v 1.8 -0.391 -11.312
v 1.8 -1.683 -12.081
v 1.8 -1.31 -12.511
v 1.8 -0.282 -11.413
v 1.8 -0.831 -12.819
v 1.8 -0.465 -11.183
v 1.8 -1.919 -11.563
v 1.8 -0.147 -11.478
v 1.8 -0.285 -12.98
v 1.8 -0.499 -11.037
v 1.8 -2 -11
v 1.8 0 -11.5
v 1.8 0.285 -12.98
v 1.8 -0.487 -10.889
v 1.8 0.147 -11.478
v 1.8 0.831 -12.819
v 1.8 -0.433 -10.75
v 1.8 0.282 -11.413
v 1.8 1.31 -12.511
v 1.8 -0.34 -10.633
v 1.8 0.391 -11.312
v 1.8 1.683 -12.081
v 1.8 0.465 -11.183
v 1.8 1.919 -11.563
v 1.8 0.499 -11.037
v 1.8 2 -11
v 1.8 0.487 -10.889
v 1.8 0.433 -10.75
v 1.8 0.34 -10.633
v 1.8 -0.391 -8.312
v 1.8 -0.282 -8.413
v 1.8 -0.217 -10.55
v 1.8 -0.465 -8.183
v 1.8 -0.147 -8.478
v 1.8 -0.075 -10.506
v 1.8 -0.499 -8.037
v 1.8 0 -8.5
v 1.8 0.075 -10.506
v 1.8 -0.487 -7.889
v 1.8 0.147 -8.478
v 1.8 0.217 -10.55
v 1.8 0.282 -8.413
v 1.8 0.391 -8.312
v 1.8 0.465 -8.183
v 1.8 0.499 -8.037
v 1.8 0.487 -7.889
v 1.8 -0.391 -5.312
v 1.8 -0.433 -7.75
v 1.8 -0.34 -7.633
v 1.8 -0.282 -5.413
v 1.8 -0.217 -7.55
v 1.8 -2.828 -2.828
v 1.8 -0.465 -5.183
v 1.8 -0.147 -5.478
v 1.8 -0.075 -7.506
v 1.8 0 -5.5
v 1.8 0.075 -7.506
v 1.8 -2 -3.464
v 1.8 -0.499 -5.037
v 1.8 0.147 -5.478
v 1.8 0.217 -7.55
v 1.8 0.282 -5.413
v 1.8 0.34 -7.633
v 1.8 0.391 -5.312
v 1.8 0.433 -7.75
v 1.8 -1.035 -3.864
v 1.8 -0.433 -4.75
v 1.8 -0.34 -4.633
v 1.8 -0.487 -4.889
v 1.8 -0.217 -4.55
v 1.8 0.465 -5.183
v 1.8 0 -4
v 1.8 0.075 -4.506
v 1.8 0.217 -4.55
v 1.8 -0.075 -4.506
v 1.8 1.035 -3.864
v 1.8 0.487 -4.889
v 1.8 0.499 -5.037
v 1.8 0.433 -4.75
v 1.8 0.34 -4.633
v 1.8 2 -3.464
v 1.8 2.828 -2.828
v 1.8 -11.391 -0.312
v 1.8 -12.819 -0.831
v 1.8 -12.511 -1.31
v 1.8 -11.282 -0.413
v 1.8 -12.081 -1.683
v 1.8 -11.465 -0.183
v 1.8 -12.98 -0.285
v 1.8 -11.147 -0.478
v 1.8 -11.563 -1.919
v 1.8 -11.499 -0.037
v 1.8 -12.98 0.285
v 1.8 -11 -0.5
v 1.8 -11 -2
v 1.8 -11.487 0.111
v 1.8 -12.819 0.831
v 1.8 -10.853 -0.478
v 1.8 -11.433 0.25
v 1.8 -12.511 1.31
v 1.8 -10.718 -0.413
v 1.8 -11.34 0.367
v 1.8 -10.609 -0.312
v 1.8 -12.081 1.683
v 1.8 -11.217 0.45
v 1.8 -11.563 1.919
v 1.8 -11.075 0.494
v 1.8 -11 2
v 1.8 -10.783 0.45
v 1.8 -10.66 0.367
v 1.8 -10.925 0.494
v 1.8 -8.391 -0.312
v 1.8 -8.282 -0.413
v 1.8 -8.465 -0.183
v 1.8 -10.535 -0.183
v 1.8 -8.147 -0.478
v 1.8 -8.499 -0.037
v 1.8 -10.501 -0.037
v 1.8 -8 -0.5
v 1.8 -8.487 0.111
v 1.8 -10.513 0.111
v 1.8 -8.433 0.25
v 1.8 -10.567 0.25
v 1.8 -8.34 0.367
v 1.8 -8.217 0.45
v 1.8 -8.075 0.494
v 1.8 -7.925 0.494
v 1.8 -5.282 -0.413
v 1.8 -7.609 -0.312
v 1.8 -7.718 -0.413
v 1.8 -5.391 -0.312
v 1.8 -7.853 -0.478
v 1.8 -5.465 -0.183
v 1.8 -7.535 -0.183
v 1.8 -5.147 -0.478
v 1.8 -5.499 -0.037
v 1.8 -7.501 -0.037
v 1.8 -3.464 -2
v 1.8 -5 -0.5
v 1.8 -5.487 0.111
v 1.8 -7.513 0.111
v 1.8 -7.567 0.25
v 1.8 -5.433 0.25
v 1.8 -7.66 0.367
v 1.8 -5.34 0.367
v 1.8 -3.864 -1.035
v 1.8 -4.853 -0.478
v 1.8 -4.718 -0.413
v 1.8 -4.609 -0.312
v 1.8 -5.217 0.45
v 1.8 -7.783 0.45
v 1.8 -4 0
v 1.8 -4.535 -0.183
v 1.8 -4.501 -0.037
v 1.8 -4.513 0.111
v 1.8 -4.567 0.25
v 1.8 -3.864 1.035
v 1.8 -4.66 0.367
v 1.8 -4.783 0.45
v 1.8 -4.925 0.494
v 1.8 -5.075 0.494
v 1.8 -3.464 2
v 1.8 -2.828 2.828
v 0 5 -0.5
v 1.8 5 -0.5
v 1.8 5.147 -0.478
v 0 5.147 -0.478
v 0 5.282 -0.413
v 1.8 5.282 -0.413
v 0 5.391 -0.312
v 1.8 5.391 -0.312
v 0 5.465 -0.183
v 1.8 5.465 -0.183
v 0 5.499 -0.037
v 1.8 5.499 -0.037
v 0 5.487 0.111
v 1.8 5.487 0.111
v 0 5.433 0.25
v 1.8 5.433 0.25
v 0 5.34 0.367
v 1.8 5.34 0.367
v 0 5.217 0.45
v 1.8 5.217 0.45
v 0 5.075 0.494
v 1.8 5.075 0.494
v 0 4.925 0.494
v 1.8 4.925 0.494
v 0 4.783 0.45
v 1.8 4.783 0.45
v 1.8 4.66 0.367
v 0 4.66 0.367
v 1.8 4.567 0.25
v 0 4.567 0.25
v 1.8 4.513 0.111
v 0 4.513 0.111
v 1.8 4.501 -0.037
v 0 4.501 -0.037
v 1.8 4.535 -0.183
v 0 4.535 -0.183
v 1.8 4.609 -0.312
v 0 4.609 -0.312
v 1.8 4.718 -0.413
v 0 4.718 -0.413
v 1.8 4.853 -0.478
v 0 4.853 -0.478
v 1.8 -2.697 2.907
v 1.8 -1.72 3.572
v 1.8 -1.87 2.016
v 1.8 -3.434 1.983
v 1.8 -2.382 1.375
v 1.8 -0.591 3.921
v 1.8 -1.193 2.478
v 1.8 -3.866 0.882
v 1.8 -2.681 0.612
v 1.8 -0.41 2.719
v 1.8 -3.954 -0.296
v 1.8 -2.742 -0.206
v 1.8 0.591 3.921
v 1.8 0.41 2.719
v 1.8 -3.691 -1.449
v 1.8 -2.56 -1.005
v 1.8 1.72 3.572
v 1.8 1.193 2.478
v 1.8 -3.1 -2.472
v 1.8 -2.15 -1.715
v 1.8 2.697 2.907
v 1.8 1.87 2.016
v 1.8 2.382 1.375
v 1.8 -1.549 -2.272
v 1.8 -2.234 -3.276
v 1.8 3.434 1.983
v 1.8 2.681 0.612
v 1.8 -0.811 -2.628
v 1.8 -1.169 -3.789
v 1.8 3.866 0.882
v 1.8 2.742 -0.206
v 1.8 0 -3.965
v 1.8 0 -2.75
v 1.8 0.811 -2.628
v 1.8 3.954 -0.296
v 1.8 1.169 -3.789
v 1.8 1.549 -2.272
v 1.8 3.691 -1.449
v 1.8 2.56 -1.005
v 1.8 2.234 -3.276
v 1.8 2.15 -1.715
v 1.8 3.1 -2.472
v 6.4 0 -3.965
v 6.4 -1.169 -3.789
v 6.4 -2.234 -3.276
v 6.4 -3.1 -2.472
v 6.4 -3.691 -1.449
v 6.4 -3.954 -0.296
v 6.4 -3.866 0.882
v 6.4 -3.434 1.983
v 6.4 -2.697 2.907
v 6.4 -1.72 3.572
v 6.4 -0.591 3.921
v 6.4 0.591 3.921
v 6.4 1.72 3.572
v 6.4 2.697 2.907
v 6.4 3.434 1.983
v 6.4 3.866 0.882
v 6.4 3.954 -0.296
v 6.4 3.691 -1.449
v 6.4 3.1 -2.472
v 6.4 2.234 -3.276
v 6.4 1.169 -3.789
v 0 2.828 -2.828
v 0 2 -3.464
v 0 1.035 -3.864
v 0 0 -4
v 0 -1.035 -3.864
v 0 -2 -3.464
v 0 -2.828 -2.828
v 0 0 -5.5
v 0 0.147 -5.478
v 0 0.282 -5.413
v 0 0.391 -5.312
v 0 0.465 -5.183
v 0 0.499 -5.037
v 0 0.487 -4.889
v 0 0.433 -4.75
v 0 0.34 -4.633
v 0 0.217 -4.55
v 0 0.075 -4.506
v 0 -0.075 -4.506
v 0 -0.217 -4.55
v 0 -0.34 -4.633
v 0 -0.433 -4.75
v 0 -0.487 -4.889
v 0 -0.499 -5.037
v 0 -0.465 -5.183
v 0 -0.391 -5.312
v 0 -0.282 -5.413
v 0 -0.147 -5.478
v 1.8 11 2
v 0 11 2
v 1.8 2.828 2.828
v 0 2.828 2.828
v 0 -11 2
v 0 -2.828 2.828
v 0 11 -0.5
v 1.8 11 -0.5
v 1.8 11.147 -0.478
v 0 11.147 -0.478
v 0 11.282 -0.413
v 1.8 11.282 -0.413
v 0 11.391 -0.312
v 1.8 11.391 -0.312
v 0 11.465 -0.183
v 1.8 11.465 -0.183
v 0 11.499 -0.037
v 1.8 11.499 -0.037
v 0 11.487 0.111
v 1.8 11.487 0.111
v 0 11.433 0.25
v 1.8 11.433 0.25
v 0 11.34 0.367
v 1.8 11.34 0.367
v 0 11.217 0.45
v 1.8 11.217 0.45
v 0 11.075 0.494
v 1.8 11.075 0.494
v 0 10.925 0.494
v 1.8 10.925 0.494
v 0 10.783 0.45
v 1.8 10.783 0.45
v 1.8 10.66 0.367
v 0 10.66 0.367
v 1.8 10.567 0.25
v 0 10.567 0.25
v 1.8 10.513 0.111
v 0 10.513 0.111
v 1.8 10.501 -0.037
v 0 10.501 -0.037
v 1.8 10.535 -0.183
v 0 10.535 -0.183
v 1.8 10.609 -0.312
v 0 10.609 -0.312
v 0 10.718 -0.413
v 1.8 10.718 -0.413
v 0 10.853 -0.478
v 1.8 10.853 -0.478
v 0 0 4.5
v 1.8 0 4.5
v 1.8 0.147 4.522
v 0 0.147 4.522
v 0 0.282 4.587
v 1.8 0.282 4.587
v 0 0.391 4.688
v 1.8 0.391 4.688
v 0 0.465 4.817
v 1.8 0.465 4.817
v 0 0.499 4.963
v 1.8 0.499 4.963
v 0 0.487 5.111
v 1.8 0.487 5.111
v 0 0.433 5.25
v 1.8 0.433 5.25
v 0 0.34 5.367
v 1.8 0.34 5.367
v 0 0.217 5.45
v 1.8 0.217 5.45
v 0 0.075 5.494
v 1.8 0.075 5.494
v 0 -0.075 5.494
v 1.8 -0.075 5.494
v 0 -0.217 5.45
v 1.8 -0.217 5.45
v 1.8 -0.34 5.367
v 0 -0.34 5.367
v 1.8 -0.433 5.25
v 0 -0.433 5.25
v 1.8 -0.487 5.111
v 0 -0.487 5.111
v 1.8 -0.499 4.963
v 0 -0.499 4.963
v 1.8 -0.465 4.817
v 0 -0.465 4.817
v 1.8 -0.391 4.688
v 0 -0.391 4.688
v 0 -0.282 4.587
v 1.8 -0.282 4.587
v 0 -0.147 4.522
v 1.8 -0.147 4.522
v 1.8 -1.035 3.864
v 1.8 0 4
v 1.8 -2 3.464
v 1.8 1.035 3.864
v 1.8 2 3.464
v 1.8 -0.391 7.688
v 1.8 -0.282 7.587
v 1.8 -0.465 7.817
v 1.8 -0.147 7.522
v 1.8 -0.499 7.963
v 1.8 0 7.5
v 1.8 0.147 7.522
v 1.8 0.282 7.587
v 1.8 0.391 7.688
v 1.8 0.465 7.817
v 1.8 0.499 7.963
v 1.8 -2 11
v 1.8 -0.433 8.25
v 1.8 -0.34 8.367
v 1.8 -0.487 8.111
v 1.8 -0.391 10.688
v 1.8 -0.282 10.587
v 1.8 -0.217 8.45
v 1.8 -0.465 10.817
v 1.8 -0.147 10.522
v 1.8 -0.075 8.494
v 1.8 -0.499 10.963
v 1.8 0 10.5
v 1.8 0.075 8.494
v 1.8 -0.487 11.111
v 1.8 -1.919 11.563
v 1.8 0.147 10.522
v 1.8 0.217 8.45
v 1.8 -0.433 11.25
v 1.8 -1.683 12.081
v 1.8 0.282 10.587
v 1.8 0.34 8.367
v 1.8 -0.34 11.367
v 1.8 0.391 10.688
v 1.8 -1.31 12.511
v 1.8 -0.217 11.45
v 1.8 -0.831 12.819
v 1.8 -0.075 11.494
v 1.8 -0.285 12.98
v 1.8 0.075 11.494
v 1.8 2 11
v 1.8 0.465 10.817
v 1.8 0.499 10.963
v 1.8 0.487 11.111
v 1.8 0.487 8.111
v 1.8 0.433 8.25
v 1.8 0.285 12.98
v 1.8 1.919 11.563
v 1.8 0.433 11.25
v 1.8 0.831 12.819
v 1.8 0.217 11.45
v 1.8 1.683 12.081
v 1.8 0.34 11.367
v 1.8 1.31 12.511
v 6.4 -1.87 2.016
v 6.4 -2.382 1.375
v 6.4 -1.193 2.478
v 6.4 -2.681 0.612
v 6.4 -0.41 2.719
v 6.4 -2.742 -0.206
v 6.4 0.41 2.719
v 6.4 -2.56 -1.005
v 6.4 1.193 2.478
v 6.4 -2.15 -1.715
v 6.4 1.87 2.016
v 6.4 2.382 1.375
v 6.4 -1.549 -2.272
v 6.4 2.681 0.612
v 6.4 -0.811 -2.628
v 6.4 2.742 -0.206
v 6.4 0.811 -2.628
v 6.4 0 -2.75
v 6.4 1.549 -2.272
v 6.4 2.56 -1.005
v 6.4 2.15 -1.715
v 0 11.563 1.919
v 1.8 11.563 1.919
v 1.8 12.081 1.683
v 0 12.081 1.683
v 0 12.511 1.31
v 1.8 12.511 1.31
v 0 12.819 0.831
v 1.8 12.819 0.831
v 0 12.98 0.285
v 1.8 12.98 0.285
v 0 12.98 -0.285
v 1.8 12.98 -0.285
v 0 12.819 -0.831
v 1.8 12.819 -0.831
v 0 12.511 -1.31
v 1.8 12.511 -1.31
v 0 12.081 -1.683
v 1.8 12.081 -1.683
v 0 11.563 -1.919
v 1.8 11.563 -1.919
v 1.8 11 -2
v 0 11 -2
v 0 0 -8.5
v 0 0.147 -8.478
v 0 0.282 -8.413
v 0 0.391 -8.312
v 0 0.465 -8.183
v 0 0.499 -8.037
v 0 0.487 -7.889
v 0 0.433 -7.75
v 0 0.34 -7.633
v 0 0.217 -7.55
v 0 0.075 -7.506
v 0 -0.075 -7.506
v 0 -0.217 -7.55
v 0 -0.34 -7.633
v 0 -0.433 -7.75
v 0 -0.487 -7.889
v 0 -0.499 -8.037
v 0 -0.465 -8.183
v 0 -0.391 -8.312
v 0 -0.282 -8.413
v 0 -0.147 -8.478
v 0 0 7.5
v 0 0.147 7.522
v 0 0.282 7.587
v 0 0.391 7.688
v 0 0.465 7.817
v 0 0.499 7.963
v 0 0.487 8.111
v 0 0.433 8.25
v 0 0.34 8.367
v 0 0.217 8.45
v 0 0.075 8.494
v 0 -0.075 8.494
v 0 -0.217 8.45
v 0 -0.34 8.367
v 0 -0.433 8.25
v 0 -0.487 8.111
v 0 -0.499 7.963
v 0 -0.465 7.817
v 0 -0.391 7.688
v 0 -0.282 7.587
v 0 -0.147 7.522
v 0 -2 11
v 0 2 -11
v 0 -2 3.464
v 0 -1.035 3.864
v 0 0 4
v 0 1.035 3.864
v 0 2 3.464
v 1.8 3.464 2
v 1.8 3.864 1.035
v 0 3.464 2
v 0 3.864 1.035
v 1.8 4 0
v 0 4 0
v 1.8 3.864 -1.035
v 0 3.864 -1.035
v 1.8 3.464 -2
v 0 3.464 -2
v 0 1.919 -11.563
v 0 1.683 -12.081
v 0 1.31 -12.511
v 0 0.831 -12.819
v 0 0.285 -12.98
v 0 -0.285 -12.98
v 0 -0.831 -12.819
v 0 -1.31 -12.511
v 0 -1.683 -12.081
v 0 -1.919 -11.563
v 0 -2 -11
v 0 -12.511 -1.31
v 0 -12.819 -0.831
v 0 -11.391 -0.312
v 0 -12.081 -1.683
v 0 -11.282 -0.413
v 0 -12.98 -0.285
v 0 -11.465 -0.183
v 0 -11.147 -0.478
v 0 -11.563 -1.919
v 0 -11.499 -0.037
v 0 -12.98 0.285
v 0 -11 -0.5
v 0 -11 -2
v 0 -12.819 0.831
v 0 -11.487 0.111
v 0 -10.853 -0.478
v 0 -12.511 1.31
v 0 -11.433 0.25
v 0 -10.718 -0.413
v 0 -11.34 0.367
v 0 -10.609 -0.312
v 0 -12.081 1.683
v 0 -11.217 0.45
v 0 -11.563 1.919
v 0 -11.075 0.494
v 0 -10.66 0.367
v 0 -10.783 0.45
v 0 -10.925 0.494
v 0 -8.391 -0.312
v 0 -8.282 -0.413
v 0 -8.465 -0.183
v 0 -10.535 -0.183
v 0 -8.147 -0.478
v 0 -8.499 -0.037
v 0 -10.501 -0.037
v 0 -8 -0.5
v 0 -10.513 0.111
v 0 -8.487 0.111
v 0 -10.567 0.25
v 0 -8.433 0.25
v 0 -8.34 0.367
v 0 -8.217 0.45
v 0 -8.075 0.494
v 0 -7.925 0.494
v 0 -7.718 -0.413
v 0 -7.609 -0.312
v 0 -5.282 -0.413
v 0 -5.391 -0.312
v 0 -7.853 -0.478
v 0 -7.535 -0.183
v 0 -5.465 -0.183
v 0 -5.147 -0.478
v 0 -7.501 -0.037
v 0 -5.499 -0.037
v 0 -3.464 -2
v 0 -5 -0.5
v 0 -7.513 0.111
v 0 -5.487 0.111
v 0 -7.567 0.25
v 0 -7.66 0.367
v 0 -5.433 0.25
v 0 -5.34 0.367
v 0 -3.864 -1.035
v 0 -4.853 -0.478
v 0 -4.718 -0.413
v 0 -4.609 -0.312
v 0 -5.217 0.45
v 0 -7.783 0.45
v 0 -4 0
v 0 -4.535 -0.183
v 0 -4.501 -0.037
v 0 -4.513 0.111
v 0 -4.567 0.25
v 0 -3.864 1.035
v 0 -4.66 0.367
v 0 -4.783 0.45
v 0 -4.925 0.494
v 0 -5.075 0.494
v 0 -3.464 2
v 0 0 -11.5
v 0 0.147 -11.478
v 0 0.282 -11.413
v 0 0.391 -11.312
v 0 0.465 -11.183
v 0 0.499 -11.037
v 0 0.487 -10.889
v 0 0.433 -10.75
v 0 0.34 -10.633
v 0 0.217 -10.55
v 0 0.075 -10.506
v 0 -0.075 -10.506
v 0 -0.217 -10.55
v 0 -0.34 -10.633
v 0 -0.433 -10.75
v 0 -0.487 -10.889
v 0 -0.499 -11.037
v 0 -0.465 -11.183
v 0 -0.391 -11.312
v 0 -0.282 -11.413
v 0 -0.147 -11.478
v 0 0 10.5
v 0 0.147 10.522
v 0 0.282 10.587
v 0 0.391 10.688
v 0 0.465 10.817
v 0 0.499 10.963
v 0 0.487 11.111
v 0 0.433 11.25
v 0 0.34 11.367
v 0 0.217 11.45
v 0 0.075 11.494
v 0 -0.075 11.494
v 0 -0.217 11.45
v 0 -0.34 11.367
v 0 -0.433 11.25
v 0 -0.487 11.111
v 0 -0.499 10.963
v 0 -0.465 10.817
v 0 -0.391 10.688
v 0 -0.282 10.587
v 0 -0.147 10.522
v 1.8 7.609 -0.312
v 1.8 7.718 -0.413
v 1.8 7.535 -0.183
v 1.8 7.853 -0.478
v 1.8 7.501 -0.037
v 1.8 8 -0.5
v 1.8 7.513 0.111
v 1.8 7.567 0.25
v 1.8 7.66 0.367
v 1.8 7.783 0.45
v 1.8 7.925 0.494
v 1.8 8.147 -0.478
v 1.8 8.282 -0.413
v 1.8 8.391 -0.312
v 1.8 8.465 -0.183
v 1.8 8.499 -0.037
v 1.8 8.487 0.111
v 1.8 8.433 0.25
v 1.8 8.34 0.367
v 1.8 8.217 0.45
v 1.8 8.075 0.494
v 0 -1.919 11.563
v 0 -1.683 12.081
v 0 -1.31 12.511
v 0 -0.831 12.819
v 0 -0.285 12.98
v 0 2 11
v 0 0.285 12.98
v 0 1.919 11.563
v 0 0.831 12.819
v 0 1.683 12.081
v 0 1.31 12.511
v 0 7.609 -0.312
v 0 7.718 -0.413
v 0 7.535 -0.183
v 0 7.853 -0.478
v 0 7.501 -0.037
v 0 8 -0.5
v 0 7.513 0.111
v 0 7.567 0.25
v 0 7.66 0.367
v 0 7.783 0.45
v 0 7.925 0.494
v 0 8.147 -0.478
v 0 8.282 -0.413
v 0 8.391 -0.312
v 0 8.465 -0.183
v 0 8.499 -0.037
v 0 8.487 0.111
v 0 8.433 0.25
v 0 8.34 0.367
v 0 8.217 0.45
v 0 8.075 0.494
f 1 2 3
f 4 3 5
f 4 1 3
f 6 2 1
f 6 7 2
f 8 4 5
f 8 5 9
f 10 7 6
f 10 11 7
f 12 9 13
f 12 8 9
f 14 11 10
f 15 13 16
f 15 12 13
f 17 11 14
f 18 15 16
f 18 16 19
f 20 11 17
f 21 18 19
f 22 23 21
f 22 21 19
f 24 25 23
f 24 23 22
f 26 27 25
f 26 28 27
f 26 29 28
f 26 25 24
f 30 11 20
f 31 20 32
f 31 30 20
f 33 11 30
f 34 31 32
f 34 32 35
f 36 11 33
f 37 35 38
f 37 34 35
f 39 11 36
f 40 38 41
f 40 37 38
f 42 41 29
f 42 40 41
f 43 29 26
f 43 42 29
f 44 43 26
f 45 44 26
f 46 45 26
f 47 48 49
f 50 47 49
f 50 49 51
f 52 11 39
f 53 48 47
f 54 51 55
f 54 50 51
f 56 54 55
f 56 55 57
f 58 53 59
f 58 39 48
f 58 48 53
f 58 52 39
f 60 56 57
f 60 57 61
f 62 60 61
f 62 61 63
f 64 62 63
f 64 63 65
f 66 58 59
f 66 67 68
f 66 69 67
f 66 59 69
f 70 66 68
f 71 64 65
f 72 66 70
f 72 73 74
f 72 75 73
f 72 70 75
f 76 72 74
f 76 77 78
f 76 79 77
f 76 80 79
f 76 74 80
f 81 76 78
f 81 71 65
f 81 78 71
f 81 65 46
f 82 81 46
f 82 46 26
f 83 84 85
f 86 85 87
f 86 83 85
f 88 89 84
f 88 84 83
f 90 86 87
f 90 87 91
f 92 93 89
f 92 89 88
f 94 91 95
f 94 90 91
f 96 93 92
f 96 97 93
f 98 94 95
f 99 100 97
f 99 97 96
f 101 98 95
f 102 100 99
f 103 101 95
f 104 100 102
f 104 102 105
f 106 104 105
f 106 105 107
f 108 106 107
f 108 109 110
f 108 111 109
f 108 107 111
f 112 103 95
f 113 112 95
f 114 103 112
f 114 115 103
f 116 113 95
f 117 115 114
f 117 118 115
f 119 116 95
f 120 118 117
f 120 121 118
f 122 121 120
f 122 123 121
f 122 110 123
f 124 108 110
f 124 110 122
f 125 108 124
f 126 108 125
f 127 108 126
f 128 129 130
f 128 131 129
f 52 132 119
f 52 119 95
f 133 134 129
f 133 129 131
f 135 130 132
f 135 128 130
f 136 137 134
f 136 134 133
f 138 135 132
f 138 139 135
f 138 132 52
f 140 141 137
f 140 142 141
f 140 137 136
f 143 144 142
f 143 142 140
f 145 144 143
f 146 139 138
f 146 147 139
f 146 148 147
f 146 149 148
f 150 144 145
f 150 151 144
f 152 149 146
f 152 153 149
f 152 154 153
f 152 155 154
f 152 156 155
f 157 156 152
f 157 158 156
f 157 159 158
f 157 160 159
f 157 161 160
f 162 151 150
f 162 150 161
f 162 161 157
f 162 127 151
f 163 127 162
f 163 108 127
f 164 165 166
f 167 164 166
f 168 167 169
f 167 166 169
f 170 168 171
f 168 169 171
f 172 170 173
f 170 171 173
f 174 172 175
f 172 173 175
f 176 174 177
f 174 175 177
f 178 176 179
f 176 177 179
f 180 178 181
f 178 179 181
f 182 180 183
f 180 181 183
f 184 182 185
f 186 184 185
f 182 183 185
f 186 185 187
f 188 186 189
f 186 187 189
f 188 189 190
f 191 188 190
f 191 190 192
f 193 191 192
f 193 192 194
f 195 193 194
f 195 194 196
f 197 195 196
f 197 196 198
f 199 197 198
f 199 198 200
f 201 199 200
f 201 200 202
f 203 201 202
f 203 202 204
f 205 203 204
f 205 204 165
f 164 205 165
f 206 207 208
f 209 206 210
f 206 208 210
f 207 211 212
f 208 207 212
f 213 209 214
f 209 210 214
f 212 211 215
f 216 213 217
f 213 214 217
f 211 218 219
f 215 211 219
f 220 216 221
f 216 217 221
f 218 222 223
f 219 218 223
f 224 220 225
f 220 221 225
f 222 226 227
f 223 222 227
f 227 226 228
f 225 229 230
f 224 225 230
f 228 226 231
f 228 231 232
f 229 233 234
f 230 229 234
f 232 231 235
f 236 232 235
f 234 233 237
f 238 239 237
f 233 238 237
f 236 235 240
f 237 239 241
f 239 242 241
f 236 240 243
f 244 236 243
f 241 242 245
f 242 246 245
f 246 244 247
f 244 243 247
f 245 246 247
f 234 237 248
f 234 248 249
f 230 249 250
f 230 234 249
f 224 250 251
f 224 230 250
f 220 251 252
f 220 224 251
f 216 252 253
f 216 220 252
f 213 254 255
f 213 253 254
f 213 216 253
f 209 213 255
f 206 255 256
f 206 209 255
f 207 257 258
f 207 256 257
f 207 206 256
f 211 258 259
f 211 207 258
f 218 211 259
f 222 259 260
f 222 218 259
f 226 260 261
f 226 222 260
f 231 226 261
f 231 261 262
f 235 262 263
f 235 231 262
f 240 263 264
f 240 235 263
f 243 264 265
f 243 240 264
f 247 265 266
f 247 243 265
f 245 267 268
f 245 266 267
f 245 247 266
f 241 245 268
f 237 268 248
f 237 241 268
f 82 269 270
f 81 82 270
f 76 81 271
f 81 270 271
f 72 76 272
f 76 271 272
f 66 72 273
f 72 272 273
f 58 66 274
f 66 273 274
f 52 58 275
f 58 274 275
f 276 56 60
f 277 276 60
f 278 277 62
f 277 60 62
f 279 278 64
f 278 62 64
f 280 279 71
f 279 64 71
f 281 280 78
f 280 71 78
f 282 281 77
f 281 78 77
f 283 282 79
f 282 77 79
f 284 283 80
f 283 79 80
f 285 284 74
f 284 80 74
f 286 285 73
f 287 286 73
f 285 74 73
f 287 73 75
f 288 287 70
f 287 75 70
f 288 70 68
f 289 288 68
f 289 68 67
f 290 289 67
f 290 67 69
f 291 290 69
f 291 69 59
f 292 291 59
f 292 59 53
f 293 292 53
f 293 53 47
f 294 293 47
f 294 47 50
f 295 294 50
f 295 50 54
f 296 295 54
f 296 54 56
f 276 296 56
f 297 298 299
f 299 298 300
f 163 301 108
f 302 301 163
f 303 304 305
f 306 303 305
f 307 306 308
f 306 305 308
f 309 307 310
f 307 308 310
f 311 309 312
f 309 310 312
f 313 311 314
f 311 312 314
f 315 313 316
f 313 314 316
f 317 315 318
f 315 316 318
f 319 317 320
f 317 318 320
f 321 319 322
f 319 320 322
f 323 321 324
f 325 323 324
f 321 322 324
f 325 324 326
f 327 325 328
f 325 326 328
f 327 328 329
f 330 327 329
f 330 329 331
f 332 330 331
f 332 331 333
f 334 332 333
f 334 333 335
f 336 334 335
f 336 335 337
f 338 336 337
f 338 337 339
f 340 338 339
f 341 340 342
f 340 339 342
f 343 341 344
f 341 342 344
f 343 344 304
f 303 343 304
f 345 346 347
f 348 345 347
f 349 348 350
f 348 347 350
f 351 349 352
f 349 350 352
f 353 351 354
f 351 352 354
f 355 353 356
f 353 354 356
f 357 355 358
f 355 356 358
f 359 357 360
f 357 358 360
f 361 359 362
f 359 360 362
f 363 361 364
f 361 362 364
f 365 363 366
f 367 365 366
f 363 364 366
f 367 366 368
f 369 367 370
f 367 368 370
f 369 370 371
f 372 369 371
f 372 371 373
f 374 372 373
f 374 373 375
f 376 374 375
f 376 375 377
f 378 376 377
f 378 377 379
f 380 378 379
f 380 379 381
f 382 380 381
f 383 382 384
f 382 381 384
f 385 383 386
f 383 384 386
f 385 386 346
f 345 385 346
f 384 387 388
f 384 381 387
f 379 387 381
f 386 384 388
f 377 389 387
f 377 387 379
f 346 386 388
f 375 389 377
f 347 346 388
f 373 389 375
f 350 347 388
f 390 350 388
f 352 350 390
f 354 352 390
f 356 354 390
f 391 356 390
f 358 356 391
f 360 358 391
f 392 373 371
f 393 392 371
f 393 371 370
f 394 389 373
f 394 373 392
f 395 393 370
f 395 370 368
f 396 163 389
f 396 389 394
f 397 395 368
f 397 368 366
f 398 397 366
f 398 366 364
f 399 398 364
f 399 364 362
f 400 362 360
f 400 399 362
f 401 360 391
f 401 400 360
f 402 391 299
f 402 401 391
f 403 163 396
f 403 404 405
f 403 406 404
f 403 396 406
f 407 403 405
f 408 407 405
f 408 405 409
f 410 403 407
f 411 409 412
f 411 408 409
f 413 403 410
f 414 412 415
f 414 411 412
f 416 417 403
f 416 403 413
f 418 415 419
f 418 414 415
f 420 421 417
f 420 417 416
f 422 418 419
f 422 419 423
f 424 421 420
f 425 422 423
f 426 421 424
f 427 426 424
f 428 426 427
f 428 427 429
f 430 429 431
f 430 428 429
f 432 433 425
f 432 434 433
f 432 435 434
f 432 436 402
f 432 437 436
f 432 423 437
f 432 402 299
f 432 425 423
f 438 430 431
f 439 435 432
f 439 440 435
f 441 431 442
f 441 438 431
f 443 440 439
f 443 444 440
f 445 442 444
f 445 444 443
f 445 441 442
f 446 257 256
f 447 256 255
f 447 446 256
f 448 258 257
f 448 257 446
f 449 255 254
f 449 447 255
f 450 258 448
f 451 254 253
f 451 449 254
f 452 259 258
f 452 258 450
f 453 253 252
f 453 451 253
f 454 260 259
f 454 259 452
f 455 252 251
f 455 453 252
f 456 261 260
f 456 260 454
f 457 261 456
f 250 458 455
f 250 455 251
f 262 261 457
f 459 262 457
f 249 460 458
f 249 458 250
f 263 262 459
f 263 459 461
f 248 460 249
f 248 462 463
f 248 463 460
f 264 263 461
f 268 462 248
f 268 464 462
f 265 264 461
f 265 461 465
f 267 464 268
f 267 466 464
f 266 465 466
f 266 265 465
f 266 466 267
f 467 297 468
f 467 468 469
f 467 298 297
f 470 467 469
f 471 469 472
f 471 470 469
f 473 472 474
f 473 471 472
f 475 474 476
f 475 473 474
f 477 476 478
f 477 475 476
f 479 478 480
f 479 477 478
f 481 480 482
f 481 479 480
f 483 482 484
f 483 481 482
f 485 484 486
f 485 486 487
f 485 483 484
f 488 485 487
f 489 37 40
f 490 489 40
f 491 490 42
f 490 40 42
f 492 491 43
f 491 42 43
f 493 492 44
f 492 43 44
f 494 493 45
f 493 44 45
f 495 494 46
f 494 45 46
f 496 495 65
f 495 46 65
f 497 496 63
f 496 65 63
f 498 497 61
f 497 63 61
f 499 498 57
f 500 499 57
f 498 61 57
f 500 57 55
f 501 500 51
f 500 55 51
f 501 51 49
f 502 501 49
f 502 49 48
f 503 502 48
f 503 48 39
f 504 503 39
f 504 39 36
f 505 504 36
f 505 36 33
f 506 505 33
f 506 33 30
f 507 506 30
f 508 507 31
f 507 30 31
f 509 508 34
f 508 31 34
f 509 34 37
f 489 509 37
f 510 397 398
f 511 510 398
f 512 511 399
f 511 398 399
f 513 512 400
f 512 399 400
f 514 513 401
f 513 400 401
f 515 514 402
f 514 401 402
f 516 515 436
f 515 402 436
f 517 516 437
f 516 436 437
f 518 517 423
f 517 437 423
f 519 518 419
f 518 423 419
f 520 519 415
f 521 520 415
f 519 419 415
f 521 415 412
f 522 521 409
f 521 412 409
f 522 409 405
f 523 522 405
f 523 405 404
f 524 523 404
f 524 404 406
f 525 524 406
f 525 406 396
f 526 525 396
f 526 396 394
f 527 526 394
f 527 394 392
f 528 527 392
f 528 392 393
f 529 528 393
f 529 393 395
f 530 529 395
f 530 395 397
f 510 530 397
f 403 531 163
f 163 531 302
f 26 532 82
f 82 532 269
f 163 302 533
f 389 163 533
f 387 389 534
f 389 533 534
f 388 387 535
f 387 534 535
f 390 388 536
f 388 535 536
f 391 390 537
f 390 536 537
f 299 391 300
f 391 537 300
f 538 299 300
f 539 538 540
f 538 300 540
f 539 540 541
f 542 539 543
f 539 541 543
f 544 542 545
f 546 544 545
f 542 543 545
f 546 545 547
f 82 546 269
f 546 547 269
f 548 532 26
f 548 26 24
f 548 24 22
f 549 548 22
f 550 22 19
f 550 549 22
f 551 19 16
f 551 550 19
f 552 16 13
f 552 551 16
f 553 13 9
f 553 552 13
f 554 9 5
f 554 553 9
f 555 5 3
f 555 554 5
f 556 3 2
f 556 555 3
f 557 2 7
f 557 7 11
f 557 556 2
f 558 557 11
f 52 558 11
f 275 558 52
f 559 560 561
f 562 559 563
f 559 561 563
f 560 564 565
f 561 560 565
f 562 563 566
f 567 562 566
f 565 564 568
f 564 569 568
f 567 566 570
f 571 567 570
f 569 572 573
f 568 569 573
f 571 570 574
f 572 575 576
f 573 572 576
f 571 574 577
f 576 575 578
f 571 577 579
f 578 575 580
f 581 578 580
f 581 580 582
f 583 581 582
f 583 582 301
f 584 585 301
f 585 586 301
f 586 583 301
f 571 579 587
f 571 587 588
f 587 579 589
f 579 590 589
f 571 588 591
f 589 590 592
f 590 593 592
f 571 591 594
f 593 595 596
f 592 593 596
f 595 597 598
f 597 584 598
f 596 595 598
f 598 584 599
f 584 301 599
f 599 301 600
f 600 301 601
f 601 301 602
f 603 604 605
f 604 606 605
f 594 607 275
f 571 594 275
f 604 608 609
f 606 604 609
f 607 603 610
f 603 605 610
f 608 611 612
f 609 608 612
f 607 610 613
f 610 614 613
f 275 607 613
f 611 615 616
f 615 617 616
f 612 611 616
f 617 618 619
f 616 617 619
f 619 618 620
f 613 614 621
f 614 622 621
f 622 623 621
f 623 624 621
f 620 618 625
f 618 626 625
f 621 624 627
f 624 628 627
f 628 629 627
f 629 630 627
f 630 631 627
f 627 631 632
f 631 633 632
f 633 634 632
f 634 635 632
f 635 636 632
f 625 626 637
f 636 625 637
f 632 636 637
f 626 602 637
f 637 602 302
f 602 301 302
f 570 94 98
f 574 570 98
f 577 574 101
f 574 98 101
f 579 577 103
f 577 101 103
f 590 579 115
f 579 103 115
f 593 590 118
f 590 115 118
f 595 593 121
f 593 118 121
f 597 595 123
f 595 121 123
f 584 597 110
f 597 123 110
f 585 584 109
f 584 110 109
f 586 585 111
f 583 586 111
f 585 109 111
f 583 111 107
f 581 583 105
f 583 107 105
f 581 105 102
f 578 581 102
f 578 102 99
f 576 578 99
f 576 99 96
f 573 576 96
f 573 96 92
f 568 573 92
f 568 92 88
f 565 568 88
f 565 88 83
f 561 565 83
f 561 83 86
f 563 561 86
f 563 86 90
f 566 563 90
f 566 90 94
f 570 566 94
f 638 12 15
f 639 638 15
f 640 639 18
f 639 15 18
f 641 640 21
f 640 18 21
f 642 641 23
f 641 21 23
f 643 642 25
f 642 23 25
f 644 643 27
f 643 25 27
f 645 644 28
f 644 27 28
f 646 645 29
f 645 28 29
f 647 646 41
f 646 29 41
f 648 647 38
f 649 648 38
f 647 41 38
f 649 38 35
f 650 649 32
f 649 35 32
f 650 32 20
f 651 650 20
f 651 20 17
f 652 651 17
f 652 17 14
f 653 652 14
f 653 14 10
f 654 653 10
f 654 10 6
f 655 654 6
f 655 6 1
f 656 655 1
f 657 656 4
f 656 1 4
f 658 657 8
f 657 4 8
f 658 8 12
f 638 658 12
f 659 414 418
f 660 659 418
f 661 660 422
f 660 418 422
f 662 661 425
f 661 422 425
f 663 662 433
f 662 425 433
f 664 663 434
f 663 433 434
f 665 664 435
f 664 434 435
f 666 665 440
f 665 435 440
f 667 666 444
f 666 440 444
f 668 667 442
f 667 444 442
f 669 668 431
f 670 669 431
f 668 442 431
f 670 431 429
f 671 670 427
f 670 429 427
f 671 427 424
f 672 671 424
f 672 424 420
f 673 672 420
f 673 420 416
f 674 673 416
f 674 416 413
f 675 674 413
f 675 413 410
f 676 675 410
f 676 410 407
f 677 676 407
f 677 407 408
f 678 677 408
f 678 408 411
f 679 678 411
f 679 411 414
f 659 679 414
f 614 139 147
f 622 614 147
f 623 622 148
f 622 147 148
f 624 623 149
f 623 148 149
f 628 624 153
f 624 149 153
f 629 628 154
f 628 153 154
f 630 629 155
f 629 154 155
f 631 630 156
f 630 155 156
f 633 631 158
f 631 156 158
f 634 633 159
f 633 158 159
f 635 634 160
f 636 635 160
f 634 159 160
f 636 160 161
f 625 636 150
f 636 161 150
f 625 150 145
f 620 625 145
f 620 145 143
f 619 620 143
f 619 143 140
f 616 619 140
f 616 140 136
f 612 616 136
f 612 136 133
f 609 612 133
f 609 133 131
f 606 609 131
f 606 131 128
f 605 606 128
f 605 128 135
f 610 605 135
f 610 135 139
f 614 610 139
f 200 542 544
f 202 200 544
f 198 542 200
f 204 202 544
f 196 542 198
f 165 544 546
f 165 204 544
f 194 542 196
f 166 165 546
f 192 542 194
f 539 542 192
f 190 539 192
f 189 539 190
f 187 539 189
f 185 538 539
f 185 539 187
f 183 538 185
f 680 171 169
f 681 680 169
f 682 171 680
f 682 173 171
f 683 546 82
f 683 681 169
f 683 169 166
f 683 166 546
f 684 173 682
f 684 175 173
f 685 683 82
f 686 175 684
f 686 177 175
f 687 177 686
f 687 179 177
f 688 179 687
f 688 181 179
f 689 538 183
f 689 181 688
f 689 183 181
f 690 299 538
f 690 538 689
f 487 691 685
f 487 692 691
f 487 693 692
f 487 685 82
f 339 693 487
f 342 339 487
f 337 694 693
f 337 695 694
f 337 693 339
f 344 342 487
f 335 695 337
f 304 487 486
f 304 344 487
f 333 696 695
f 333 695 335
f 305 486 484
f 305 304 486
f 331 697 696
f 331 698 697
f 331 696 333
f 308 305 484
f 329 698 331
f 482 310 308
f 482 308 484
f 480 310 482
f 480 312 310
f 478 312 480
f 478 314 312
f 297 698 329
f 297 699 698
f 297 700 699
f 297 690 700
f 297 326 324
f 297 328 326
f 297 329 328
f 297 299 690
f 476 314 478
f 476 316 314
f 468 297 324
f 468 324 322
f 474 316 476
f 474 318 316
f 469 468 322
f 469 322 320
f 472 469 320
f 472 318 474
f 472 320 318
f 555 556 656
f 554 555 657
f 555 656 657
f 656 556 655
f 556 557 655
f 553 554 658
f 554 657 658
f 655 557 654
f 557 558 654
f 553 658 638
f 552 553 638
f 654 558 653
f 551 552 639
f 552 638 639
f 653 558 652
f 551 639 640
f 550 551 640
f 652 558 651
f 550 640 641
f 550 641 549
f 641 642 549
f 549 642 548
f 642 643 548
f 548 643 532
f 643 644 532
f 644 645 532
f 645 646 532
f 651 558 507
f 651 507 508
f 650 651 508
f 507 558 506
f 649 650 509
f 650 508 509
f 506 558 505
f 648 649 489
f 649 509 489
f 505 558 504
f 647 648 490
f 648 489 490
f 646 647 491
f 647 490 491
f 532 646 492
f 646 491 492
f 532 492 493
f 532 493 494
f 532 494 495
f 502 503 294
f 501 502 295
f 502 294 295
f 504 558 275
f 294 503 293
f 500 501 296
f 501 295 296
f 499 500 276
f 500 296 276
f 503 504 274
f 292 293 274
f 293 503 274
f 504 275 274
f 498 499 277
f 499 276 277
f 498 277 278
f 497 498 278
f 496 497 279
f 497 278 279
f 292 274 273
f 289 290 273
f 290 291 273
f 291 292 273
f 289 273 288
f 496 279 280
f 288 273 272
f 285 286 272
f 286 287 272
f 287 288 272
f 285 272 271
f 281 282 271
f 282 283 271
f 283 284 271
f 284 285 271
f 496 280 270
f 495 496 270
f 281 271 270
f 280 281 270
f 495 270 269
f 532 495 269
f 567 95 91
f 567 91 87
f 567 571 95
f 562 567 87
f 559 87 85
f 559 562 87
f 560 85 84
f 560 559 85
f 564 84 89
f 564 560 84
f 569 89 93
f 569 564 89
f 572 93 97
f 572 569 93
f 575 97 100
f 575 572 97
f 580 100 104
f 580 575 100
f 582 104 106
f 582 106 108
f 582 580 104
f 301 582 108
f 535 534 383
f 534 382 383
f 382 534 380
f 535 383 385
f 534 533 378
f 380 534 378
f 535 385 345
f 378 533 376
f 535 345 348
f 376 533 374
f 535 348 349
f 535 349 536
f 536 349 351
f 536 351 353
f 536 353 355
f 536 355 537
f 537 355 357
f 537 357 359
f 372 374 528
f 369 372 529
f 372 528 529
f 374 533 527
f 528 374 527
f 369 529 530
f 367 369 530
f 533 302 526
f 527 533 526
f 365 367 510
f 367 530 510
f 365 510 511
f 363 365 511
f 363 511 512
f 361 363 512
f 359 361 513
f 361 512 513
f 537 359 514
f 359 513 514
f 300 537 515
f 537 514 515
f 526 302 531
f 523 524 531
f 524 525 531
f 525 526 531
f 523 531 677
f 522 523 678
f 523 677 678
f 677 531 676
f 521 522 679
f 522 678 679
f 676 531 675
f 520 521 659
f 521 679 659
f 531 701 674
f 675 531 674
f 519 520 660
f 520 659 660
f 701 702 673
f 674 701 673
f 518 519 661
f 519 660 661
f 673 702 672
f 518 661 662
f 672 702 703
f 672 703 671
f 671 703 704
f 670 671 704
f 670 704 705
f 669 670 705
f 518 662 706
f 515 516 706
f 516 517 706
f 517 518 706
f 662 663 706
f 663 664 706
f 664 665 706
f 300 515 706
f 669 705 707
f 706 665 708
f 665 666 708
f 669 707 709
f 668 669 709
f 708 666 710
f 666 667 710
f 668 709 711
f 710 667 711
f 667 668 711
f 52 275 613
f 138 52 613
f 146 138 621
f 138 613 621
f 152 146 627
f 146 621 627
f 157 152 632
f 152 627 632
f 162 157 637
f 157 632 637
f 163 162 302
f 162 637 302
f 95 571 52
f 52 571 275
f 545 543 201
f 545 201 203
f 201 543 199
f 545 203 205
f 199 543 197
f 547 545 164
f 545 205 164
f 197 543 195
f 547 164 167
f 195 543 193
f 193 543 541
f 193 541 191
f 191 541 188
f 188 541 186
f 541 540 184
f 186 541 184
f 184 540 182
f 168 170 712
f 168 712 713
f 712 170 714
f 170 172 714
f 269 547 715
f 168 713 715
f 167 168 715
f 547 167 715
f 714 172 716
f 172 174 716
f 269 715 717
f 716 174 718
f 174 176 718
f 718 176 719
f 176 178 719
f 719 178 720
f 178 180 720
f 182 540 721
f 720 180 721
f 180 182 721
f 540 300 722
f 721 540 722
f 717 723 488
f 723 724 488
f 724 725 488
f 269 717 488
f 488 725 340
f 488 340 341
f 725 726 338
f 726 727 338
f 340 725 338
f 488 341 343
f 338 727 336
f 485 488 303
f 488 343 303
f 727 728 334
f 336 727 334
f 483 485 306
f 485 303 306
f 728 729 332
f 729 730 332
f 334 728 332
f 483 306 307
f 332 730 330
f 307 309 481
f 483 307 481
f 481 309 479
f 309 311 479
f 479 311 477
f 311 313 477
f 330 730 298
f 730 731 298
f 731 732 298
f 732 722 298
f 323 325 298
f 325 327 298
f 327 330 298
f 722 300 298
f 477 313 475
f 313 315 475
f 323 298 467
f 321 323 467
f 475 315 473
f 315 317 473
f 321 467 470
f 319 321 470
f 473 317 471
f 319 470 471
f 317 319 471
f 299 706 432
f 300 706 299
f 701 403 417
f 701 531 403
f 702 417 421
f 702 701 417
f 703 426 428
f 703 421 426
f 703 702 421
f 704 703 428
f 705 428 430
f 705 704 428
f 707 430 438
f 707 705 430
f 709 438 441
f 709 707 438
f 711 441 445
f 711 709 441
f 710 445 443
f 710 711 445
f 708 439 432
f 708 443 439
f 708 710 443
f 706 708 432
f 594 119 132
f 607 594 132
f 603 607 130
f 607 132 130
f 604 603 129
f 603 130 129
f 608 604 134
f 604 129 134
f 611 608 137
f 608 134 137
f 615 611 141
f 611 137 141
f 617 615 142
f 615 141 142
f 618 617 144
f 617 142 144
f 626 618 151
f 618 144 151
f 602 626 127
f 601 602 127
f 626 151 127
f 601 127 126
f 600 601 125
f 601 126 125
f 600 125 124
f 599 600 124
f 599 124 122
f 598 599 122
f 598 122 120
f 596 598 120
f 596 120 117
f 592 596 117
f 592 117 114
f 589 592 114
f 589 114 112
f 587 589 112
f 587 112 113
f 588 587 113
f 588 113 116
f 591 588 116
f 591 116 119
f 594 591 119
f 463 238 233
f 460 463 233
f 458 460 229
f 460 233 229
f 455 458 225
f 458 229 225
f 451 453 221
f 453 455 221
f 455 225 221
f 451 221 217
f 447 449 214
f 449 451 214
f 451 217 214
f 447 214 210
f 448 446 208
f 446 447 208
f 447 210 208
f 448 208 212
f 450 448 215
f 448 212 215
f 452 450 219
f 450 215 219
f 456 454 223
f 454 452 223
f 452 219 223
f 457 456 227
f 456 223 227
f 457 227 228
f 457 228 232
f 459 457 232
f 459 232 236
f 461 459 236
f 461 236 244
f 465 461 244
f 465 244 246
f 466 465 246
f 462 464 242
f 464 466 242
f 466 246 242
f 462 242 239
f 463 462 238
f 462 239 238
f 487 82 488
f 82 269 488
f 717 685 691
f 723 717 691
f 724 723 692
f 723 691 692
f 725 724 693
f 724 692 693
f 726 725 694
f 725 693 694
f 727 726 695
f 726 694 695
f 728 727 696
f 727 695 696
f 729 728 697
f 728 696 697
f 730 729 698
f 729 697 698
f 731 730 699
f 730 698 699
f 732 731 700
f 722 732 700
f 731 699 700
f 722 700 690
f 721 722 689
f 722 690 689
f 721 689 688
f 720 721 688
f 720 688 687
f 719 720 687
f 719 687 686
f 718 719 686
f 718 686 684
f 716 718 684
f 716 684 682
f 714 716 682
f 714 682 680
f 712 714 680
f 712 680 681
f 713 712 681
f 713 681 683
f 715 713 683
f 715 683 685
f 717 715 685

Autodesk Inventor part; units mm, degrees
ref_plane "YZ Plane" through (0, 0, 0) normal (1, 0, 0) x (0, 1, 0)
ref_plane "XZ Plane" through (0, 0, 0) normal (0, 1, 0) x (-1, 0, 0)
ref_plane "XY Plane" through (0, 0, 0) normal (0, 0, 1) x (1, 0, 0)
sketch "Skizze1" plane through (0, 0, 0) normal (1, 0, 0) x (0, 1, 0)
  circle A0 centre (0, 0) radius 4
  circle A1 centre (0, 0) radius 2.75
  arc A2 (-11, 2) -> (-11, -2) centre (-11, 0) ccw
  arc A3 (-2, -11) -> (2, -11) centre (0, -11) ccw
  arc A4 (11, -2) -> (11, 2) centre (11, 0) ccw
  arc A5 (2, 11) -> (-2, 11) centre (0, 11) ccw
  line L0 (0, 18.2) -> (0, -18.2) projected
  line L1 (-18.2, 0) -> (18.2, 0) projected
  line L2 (-18.2, 0) -> (18.2, 0) projected
  line L3 (0, -18.2) -> (0, 18.2) projected
  line L4 (2, 11) -> (2.8284, 2.8284)
  line L5 (-2, 11) -> (-2.8284, 2.8284)
  line L6 (-11, 2) -> (-2.8284, 2.8284)
  line L7 (-11, -2) -> (-2.8284, -2.8284)
  line L8 (-2, -11) -> (-2.8284, -2.8284)
  line L9 (2, -11) -> (2.8284, -2.8284)
  line L10 (2.8284, -2.8284) -> (11, -2)
  line L11 (11, 2) -> (2.8284, 2.8284)
  dimension "d0" = 8
  dimension "d1" = 5.5
extrude "Extrusion1" add sketch "Skizze1" along normal blind 1.8 contours L1 A4 L10 A0 | A0 L11 A4 L1 | A0 L0 A5 L4 | L9 A3 L0 A0 | A0 L5 A5 L0 | L0 A3 L8 A0 | A0 L1 A2 L6 | L7 A2 L1 A0
sketch "Skizze2" plane through (1.8, 0, 0) normal (1, 0, 0) x (0, 0, -1)
  circle A0 centre (0, 0) radius 2.75
  circle A1 centre (0, 0) radius 3.965
  dimension "d18" = 5.5
extrude "Extrusion2" add sketch "Skizze2" along normal blind 4.6
sketch "Skizze3" plane through (1.8, 0, 0) normal (1, 0, 0) x (0, 0, -1)
  circle A0 centre (0, -11) radius 0.5
  circle A1 centre (0, -8) radius 0.5
  circle A2 centre (0, -5) radius 0.5
  circle A3 centre (0, 5) radius 0.5
  circle A4 centre (0, 8) radius 0.5
  circle A5 centre (0, 11) radius 0.5
  circle A6 centre (5, 0) radius 0.5
  circle A7 centre (8, 0) radius 0.5
  circle A8 centre (11, 0) radius 0.5
  circle A9 centre (-5, 0) radius 0.5
  circle A10 centre (-8, 0) radius 0.5
  circle A11 centre (-11, 0) radius 0.5
  point P0 (0, 0)
  dimension "d33" = 1
  dimension "d34" = 1
  dimension "d35" = 1
  dimension "d36" = 1
  dimension "d37" = 1
  dimension "d38" = 1
  dimension "d39" = 1
  dimension "d40" = 1
  dimension "d41" = 1
  dimension "d42" = 1
  dimension "d43" = 1
  dimension "d44" = 1
extrude "Extrusion3" cut sketch "Skizze3" against normal blind 10
properties part number "Ruderhorn_klein_Kreuz"
